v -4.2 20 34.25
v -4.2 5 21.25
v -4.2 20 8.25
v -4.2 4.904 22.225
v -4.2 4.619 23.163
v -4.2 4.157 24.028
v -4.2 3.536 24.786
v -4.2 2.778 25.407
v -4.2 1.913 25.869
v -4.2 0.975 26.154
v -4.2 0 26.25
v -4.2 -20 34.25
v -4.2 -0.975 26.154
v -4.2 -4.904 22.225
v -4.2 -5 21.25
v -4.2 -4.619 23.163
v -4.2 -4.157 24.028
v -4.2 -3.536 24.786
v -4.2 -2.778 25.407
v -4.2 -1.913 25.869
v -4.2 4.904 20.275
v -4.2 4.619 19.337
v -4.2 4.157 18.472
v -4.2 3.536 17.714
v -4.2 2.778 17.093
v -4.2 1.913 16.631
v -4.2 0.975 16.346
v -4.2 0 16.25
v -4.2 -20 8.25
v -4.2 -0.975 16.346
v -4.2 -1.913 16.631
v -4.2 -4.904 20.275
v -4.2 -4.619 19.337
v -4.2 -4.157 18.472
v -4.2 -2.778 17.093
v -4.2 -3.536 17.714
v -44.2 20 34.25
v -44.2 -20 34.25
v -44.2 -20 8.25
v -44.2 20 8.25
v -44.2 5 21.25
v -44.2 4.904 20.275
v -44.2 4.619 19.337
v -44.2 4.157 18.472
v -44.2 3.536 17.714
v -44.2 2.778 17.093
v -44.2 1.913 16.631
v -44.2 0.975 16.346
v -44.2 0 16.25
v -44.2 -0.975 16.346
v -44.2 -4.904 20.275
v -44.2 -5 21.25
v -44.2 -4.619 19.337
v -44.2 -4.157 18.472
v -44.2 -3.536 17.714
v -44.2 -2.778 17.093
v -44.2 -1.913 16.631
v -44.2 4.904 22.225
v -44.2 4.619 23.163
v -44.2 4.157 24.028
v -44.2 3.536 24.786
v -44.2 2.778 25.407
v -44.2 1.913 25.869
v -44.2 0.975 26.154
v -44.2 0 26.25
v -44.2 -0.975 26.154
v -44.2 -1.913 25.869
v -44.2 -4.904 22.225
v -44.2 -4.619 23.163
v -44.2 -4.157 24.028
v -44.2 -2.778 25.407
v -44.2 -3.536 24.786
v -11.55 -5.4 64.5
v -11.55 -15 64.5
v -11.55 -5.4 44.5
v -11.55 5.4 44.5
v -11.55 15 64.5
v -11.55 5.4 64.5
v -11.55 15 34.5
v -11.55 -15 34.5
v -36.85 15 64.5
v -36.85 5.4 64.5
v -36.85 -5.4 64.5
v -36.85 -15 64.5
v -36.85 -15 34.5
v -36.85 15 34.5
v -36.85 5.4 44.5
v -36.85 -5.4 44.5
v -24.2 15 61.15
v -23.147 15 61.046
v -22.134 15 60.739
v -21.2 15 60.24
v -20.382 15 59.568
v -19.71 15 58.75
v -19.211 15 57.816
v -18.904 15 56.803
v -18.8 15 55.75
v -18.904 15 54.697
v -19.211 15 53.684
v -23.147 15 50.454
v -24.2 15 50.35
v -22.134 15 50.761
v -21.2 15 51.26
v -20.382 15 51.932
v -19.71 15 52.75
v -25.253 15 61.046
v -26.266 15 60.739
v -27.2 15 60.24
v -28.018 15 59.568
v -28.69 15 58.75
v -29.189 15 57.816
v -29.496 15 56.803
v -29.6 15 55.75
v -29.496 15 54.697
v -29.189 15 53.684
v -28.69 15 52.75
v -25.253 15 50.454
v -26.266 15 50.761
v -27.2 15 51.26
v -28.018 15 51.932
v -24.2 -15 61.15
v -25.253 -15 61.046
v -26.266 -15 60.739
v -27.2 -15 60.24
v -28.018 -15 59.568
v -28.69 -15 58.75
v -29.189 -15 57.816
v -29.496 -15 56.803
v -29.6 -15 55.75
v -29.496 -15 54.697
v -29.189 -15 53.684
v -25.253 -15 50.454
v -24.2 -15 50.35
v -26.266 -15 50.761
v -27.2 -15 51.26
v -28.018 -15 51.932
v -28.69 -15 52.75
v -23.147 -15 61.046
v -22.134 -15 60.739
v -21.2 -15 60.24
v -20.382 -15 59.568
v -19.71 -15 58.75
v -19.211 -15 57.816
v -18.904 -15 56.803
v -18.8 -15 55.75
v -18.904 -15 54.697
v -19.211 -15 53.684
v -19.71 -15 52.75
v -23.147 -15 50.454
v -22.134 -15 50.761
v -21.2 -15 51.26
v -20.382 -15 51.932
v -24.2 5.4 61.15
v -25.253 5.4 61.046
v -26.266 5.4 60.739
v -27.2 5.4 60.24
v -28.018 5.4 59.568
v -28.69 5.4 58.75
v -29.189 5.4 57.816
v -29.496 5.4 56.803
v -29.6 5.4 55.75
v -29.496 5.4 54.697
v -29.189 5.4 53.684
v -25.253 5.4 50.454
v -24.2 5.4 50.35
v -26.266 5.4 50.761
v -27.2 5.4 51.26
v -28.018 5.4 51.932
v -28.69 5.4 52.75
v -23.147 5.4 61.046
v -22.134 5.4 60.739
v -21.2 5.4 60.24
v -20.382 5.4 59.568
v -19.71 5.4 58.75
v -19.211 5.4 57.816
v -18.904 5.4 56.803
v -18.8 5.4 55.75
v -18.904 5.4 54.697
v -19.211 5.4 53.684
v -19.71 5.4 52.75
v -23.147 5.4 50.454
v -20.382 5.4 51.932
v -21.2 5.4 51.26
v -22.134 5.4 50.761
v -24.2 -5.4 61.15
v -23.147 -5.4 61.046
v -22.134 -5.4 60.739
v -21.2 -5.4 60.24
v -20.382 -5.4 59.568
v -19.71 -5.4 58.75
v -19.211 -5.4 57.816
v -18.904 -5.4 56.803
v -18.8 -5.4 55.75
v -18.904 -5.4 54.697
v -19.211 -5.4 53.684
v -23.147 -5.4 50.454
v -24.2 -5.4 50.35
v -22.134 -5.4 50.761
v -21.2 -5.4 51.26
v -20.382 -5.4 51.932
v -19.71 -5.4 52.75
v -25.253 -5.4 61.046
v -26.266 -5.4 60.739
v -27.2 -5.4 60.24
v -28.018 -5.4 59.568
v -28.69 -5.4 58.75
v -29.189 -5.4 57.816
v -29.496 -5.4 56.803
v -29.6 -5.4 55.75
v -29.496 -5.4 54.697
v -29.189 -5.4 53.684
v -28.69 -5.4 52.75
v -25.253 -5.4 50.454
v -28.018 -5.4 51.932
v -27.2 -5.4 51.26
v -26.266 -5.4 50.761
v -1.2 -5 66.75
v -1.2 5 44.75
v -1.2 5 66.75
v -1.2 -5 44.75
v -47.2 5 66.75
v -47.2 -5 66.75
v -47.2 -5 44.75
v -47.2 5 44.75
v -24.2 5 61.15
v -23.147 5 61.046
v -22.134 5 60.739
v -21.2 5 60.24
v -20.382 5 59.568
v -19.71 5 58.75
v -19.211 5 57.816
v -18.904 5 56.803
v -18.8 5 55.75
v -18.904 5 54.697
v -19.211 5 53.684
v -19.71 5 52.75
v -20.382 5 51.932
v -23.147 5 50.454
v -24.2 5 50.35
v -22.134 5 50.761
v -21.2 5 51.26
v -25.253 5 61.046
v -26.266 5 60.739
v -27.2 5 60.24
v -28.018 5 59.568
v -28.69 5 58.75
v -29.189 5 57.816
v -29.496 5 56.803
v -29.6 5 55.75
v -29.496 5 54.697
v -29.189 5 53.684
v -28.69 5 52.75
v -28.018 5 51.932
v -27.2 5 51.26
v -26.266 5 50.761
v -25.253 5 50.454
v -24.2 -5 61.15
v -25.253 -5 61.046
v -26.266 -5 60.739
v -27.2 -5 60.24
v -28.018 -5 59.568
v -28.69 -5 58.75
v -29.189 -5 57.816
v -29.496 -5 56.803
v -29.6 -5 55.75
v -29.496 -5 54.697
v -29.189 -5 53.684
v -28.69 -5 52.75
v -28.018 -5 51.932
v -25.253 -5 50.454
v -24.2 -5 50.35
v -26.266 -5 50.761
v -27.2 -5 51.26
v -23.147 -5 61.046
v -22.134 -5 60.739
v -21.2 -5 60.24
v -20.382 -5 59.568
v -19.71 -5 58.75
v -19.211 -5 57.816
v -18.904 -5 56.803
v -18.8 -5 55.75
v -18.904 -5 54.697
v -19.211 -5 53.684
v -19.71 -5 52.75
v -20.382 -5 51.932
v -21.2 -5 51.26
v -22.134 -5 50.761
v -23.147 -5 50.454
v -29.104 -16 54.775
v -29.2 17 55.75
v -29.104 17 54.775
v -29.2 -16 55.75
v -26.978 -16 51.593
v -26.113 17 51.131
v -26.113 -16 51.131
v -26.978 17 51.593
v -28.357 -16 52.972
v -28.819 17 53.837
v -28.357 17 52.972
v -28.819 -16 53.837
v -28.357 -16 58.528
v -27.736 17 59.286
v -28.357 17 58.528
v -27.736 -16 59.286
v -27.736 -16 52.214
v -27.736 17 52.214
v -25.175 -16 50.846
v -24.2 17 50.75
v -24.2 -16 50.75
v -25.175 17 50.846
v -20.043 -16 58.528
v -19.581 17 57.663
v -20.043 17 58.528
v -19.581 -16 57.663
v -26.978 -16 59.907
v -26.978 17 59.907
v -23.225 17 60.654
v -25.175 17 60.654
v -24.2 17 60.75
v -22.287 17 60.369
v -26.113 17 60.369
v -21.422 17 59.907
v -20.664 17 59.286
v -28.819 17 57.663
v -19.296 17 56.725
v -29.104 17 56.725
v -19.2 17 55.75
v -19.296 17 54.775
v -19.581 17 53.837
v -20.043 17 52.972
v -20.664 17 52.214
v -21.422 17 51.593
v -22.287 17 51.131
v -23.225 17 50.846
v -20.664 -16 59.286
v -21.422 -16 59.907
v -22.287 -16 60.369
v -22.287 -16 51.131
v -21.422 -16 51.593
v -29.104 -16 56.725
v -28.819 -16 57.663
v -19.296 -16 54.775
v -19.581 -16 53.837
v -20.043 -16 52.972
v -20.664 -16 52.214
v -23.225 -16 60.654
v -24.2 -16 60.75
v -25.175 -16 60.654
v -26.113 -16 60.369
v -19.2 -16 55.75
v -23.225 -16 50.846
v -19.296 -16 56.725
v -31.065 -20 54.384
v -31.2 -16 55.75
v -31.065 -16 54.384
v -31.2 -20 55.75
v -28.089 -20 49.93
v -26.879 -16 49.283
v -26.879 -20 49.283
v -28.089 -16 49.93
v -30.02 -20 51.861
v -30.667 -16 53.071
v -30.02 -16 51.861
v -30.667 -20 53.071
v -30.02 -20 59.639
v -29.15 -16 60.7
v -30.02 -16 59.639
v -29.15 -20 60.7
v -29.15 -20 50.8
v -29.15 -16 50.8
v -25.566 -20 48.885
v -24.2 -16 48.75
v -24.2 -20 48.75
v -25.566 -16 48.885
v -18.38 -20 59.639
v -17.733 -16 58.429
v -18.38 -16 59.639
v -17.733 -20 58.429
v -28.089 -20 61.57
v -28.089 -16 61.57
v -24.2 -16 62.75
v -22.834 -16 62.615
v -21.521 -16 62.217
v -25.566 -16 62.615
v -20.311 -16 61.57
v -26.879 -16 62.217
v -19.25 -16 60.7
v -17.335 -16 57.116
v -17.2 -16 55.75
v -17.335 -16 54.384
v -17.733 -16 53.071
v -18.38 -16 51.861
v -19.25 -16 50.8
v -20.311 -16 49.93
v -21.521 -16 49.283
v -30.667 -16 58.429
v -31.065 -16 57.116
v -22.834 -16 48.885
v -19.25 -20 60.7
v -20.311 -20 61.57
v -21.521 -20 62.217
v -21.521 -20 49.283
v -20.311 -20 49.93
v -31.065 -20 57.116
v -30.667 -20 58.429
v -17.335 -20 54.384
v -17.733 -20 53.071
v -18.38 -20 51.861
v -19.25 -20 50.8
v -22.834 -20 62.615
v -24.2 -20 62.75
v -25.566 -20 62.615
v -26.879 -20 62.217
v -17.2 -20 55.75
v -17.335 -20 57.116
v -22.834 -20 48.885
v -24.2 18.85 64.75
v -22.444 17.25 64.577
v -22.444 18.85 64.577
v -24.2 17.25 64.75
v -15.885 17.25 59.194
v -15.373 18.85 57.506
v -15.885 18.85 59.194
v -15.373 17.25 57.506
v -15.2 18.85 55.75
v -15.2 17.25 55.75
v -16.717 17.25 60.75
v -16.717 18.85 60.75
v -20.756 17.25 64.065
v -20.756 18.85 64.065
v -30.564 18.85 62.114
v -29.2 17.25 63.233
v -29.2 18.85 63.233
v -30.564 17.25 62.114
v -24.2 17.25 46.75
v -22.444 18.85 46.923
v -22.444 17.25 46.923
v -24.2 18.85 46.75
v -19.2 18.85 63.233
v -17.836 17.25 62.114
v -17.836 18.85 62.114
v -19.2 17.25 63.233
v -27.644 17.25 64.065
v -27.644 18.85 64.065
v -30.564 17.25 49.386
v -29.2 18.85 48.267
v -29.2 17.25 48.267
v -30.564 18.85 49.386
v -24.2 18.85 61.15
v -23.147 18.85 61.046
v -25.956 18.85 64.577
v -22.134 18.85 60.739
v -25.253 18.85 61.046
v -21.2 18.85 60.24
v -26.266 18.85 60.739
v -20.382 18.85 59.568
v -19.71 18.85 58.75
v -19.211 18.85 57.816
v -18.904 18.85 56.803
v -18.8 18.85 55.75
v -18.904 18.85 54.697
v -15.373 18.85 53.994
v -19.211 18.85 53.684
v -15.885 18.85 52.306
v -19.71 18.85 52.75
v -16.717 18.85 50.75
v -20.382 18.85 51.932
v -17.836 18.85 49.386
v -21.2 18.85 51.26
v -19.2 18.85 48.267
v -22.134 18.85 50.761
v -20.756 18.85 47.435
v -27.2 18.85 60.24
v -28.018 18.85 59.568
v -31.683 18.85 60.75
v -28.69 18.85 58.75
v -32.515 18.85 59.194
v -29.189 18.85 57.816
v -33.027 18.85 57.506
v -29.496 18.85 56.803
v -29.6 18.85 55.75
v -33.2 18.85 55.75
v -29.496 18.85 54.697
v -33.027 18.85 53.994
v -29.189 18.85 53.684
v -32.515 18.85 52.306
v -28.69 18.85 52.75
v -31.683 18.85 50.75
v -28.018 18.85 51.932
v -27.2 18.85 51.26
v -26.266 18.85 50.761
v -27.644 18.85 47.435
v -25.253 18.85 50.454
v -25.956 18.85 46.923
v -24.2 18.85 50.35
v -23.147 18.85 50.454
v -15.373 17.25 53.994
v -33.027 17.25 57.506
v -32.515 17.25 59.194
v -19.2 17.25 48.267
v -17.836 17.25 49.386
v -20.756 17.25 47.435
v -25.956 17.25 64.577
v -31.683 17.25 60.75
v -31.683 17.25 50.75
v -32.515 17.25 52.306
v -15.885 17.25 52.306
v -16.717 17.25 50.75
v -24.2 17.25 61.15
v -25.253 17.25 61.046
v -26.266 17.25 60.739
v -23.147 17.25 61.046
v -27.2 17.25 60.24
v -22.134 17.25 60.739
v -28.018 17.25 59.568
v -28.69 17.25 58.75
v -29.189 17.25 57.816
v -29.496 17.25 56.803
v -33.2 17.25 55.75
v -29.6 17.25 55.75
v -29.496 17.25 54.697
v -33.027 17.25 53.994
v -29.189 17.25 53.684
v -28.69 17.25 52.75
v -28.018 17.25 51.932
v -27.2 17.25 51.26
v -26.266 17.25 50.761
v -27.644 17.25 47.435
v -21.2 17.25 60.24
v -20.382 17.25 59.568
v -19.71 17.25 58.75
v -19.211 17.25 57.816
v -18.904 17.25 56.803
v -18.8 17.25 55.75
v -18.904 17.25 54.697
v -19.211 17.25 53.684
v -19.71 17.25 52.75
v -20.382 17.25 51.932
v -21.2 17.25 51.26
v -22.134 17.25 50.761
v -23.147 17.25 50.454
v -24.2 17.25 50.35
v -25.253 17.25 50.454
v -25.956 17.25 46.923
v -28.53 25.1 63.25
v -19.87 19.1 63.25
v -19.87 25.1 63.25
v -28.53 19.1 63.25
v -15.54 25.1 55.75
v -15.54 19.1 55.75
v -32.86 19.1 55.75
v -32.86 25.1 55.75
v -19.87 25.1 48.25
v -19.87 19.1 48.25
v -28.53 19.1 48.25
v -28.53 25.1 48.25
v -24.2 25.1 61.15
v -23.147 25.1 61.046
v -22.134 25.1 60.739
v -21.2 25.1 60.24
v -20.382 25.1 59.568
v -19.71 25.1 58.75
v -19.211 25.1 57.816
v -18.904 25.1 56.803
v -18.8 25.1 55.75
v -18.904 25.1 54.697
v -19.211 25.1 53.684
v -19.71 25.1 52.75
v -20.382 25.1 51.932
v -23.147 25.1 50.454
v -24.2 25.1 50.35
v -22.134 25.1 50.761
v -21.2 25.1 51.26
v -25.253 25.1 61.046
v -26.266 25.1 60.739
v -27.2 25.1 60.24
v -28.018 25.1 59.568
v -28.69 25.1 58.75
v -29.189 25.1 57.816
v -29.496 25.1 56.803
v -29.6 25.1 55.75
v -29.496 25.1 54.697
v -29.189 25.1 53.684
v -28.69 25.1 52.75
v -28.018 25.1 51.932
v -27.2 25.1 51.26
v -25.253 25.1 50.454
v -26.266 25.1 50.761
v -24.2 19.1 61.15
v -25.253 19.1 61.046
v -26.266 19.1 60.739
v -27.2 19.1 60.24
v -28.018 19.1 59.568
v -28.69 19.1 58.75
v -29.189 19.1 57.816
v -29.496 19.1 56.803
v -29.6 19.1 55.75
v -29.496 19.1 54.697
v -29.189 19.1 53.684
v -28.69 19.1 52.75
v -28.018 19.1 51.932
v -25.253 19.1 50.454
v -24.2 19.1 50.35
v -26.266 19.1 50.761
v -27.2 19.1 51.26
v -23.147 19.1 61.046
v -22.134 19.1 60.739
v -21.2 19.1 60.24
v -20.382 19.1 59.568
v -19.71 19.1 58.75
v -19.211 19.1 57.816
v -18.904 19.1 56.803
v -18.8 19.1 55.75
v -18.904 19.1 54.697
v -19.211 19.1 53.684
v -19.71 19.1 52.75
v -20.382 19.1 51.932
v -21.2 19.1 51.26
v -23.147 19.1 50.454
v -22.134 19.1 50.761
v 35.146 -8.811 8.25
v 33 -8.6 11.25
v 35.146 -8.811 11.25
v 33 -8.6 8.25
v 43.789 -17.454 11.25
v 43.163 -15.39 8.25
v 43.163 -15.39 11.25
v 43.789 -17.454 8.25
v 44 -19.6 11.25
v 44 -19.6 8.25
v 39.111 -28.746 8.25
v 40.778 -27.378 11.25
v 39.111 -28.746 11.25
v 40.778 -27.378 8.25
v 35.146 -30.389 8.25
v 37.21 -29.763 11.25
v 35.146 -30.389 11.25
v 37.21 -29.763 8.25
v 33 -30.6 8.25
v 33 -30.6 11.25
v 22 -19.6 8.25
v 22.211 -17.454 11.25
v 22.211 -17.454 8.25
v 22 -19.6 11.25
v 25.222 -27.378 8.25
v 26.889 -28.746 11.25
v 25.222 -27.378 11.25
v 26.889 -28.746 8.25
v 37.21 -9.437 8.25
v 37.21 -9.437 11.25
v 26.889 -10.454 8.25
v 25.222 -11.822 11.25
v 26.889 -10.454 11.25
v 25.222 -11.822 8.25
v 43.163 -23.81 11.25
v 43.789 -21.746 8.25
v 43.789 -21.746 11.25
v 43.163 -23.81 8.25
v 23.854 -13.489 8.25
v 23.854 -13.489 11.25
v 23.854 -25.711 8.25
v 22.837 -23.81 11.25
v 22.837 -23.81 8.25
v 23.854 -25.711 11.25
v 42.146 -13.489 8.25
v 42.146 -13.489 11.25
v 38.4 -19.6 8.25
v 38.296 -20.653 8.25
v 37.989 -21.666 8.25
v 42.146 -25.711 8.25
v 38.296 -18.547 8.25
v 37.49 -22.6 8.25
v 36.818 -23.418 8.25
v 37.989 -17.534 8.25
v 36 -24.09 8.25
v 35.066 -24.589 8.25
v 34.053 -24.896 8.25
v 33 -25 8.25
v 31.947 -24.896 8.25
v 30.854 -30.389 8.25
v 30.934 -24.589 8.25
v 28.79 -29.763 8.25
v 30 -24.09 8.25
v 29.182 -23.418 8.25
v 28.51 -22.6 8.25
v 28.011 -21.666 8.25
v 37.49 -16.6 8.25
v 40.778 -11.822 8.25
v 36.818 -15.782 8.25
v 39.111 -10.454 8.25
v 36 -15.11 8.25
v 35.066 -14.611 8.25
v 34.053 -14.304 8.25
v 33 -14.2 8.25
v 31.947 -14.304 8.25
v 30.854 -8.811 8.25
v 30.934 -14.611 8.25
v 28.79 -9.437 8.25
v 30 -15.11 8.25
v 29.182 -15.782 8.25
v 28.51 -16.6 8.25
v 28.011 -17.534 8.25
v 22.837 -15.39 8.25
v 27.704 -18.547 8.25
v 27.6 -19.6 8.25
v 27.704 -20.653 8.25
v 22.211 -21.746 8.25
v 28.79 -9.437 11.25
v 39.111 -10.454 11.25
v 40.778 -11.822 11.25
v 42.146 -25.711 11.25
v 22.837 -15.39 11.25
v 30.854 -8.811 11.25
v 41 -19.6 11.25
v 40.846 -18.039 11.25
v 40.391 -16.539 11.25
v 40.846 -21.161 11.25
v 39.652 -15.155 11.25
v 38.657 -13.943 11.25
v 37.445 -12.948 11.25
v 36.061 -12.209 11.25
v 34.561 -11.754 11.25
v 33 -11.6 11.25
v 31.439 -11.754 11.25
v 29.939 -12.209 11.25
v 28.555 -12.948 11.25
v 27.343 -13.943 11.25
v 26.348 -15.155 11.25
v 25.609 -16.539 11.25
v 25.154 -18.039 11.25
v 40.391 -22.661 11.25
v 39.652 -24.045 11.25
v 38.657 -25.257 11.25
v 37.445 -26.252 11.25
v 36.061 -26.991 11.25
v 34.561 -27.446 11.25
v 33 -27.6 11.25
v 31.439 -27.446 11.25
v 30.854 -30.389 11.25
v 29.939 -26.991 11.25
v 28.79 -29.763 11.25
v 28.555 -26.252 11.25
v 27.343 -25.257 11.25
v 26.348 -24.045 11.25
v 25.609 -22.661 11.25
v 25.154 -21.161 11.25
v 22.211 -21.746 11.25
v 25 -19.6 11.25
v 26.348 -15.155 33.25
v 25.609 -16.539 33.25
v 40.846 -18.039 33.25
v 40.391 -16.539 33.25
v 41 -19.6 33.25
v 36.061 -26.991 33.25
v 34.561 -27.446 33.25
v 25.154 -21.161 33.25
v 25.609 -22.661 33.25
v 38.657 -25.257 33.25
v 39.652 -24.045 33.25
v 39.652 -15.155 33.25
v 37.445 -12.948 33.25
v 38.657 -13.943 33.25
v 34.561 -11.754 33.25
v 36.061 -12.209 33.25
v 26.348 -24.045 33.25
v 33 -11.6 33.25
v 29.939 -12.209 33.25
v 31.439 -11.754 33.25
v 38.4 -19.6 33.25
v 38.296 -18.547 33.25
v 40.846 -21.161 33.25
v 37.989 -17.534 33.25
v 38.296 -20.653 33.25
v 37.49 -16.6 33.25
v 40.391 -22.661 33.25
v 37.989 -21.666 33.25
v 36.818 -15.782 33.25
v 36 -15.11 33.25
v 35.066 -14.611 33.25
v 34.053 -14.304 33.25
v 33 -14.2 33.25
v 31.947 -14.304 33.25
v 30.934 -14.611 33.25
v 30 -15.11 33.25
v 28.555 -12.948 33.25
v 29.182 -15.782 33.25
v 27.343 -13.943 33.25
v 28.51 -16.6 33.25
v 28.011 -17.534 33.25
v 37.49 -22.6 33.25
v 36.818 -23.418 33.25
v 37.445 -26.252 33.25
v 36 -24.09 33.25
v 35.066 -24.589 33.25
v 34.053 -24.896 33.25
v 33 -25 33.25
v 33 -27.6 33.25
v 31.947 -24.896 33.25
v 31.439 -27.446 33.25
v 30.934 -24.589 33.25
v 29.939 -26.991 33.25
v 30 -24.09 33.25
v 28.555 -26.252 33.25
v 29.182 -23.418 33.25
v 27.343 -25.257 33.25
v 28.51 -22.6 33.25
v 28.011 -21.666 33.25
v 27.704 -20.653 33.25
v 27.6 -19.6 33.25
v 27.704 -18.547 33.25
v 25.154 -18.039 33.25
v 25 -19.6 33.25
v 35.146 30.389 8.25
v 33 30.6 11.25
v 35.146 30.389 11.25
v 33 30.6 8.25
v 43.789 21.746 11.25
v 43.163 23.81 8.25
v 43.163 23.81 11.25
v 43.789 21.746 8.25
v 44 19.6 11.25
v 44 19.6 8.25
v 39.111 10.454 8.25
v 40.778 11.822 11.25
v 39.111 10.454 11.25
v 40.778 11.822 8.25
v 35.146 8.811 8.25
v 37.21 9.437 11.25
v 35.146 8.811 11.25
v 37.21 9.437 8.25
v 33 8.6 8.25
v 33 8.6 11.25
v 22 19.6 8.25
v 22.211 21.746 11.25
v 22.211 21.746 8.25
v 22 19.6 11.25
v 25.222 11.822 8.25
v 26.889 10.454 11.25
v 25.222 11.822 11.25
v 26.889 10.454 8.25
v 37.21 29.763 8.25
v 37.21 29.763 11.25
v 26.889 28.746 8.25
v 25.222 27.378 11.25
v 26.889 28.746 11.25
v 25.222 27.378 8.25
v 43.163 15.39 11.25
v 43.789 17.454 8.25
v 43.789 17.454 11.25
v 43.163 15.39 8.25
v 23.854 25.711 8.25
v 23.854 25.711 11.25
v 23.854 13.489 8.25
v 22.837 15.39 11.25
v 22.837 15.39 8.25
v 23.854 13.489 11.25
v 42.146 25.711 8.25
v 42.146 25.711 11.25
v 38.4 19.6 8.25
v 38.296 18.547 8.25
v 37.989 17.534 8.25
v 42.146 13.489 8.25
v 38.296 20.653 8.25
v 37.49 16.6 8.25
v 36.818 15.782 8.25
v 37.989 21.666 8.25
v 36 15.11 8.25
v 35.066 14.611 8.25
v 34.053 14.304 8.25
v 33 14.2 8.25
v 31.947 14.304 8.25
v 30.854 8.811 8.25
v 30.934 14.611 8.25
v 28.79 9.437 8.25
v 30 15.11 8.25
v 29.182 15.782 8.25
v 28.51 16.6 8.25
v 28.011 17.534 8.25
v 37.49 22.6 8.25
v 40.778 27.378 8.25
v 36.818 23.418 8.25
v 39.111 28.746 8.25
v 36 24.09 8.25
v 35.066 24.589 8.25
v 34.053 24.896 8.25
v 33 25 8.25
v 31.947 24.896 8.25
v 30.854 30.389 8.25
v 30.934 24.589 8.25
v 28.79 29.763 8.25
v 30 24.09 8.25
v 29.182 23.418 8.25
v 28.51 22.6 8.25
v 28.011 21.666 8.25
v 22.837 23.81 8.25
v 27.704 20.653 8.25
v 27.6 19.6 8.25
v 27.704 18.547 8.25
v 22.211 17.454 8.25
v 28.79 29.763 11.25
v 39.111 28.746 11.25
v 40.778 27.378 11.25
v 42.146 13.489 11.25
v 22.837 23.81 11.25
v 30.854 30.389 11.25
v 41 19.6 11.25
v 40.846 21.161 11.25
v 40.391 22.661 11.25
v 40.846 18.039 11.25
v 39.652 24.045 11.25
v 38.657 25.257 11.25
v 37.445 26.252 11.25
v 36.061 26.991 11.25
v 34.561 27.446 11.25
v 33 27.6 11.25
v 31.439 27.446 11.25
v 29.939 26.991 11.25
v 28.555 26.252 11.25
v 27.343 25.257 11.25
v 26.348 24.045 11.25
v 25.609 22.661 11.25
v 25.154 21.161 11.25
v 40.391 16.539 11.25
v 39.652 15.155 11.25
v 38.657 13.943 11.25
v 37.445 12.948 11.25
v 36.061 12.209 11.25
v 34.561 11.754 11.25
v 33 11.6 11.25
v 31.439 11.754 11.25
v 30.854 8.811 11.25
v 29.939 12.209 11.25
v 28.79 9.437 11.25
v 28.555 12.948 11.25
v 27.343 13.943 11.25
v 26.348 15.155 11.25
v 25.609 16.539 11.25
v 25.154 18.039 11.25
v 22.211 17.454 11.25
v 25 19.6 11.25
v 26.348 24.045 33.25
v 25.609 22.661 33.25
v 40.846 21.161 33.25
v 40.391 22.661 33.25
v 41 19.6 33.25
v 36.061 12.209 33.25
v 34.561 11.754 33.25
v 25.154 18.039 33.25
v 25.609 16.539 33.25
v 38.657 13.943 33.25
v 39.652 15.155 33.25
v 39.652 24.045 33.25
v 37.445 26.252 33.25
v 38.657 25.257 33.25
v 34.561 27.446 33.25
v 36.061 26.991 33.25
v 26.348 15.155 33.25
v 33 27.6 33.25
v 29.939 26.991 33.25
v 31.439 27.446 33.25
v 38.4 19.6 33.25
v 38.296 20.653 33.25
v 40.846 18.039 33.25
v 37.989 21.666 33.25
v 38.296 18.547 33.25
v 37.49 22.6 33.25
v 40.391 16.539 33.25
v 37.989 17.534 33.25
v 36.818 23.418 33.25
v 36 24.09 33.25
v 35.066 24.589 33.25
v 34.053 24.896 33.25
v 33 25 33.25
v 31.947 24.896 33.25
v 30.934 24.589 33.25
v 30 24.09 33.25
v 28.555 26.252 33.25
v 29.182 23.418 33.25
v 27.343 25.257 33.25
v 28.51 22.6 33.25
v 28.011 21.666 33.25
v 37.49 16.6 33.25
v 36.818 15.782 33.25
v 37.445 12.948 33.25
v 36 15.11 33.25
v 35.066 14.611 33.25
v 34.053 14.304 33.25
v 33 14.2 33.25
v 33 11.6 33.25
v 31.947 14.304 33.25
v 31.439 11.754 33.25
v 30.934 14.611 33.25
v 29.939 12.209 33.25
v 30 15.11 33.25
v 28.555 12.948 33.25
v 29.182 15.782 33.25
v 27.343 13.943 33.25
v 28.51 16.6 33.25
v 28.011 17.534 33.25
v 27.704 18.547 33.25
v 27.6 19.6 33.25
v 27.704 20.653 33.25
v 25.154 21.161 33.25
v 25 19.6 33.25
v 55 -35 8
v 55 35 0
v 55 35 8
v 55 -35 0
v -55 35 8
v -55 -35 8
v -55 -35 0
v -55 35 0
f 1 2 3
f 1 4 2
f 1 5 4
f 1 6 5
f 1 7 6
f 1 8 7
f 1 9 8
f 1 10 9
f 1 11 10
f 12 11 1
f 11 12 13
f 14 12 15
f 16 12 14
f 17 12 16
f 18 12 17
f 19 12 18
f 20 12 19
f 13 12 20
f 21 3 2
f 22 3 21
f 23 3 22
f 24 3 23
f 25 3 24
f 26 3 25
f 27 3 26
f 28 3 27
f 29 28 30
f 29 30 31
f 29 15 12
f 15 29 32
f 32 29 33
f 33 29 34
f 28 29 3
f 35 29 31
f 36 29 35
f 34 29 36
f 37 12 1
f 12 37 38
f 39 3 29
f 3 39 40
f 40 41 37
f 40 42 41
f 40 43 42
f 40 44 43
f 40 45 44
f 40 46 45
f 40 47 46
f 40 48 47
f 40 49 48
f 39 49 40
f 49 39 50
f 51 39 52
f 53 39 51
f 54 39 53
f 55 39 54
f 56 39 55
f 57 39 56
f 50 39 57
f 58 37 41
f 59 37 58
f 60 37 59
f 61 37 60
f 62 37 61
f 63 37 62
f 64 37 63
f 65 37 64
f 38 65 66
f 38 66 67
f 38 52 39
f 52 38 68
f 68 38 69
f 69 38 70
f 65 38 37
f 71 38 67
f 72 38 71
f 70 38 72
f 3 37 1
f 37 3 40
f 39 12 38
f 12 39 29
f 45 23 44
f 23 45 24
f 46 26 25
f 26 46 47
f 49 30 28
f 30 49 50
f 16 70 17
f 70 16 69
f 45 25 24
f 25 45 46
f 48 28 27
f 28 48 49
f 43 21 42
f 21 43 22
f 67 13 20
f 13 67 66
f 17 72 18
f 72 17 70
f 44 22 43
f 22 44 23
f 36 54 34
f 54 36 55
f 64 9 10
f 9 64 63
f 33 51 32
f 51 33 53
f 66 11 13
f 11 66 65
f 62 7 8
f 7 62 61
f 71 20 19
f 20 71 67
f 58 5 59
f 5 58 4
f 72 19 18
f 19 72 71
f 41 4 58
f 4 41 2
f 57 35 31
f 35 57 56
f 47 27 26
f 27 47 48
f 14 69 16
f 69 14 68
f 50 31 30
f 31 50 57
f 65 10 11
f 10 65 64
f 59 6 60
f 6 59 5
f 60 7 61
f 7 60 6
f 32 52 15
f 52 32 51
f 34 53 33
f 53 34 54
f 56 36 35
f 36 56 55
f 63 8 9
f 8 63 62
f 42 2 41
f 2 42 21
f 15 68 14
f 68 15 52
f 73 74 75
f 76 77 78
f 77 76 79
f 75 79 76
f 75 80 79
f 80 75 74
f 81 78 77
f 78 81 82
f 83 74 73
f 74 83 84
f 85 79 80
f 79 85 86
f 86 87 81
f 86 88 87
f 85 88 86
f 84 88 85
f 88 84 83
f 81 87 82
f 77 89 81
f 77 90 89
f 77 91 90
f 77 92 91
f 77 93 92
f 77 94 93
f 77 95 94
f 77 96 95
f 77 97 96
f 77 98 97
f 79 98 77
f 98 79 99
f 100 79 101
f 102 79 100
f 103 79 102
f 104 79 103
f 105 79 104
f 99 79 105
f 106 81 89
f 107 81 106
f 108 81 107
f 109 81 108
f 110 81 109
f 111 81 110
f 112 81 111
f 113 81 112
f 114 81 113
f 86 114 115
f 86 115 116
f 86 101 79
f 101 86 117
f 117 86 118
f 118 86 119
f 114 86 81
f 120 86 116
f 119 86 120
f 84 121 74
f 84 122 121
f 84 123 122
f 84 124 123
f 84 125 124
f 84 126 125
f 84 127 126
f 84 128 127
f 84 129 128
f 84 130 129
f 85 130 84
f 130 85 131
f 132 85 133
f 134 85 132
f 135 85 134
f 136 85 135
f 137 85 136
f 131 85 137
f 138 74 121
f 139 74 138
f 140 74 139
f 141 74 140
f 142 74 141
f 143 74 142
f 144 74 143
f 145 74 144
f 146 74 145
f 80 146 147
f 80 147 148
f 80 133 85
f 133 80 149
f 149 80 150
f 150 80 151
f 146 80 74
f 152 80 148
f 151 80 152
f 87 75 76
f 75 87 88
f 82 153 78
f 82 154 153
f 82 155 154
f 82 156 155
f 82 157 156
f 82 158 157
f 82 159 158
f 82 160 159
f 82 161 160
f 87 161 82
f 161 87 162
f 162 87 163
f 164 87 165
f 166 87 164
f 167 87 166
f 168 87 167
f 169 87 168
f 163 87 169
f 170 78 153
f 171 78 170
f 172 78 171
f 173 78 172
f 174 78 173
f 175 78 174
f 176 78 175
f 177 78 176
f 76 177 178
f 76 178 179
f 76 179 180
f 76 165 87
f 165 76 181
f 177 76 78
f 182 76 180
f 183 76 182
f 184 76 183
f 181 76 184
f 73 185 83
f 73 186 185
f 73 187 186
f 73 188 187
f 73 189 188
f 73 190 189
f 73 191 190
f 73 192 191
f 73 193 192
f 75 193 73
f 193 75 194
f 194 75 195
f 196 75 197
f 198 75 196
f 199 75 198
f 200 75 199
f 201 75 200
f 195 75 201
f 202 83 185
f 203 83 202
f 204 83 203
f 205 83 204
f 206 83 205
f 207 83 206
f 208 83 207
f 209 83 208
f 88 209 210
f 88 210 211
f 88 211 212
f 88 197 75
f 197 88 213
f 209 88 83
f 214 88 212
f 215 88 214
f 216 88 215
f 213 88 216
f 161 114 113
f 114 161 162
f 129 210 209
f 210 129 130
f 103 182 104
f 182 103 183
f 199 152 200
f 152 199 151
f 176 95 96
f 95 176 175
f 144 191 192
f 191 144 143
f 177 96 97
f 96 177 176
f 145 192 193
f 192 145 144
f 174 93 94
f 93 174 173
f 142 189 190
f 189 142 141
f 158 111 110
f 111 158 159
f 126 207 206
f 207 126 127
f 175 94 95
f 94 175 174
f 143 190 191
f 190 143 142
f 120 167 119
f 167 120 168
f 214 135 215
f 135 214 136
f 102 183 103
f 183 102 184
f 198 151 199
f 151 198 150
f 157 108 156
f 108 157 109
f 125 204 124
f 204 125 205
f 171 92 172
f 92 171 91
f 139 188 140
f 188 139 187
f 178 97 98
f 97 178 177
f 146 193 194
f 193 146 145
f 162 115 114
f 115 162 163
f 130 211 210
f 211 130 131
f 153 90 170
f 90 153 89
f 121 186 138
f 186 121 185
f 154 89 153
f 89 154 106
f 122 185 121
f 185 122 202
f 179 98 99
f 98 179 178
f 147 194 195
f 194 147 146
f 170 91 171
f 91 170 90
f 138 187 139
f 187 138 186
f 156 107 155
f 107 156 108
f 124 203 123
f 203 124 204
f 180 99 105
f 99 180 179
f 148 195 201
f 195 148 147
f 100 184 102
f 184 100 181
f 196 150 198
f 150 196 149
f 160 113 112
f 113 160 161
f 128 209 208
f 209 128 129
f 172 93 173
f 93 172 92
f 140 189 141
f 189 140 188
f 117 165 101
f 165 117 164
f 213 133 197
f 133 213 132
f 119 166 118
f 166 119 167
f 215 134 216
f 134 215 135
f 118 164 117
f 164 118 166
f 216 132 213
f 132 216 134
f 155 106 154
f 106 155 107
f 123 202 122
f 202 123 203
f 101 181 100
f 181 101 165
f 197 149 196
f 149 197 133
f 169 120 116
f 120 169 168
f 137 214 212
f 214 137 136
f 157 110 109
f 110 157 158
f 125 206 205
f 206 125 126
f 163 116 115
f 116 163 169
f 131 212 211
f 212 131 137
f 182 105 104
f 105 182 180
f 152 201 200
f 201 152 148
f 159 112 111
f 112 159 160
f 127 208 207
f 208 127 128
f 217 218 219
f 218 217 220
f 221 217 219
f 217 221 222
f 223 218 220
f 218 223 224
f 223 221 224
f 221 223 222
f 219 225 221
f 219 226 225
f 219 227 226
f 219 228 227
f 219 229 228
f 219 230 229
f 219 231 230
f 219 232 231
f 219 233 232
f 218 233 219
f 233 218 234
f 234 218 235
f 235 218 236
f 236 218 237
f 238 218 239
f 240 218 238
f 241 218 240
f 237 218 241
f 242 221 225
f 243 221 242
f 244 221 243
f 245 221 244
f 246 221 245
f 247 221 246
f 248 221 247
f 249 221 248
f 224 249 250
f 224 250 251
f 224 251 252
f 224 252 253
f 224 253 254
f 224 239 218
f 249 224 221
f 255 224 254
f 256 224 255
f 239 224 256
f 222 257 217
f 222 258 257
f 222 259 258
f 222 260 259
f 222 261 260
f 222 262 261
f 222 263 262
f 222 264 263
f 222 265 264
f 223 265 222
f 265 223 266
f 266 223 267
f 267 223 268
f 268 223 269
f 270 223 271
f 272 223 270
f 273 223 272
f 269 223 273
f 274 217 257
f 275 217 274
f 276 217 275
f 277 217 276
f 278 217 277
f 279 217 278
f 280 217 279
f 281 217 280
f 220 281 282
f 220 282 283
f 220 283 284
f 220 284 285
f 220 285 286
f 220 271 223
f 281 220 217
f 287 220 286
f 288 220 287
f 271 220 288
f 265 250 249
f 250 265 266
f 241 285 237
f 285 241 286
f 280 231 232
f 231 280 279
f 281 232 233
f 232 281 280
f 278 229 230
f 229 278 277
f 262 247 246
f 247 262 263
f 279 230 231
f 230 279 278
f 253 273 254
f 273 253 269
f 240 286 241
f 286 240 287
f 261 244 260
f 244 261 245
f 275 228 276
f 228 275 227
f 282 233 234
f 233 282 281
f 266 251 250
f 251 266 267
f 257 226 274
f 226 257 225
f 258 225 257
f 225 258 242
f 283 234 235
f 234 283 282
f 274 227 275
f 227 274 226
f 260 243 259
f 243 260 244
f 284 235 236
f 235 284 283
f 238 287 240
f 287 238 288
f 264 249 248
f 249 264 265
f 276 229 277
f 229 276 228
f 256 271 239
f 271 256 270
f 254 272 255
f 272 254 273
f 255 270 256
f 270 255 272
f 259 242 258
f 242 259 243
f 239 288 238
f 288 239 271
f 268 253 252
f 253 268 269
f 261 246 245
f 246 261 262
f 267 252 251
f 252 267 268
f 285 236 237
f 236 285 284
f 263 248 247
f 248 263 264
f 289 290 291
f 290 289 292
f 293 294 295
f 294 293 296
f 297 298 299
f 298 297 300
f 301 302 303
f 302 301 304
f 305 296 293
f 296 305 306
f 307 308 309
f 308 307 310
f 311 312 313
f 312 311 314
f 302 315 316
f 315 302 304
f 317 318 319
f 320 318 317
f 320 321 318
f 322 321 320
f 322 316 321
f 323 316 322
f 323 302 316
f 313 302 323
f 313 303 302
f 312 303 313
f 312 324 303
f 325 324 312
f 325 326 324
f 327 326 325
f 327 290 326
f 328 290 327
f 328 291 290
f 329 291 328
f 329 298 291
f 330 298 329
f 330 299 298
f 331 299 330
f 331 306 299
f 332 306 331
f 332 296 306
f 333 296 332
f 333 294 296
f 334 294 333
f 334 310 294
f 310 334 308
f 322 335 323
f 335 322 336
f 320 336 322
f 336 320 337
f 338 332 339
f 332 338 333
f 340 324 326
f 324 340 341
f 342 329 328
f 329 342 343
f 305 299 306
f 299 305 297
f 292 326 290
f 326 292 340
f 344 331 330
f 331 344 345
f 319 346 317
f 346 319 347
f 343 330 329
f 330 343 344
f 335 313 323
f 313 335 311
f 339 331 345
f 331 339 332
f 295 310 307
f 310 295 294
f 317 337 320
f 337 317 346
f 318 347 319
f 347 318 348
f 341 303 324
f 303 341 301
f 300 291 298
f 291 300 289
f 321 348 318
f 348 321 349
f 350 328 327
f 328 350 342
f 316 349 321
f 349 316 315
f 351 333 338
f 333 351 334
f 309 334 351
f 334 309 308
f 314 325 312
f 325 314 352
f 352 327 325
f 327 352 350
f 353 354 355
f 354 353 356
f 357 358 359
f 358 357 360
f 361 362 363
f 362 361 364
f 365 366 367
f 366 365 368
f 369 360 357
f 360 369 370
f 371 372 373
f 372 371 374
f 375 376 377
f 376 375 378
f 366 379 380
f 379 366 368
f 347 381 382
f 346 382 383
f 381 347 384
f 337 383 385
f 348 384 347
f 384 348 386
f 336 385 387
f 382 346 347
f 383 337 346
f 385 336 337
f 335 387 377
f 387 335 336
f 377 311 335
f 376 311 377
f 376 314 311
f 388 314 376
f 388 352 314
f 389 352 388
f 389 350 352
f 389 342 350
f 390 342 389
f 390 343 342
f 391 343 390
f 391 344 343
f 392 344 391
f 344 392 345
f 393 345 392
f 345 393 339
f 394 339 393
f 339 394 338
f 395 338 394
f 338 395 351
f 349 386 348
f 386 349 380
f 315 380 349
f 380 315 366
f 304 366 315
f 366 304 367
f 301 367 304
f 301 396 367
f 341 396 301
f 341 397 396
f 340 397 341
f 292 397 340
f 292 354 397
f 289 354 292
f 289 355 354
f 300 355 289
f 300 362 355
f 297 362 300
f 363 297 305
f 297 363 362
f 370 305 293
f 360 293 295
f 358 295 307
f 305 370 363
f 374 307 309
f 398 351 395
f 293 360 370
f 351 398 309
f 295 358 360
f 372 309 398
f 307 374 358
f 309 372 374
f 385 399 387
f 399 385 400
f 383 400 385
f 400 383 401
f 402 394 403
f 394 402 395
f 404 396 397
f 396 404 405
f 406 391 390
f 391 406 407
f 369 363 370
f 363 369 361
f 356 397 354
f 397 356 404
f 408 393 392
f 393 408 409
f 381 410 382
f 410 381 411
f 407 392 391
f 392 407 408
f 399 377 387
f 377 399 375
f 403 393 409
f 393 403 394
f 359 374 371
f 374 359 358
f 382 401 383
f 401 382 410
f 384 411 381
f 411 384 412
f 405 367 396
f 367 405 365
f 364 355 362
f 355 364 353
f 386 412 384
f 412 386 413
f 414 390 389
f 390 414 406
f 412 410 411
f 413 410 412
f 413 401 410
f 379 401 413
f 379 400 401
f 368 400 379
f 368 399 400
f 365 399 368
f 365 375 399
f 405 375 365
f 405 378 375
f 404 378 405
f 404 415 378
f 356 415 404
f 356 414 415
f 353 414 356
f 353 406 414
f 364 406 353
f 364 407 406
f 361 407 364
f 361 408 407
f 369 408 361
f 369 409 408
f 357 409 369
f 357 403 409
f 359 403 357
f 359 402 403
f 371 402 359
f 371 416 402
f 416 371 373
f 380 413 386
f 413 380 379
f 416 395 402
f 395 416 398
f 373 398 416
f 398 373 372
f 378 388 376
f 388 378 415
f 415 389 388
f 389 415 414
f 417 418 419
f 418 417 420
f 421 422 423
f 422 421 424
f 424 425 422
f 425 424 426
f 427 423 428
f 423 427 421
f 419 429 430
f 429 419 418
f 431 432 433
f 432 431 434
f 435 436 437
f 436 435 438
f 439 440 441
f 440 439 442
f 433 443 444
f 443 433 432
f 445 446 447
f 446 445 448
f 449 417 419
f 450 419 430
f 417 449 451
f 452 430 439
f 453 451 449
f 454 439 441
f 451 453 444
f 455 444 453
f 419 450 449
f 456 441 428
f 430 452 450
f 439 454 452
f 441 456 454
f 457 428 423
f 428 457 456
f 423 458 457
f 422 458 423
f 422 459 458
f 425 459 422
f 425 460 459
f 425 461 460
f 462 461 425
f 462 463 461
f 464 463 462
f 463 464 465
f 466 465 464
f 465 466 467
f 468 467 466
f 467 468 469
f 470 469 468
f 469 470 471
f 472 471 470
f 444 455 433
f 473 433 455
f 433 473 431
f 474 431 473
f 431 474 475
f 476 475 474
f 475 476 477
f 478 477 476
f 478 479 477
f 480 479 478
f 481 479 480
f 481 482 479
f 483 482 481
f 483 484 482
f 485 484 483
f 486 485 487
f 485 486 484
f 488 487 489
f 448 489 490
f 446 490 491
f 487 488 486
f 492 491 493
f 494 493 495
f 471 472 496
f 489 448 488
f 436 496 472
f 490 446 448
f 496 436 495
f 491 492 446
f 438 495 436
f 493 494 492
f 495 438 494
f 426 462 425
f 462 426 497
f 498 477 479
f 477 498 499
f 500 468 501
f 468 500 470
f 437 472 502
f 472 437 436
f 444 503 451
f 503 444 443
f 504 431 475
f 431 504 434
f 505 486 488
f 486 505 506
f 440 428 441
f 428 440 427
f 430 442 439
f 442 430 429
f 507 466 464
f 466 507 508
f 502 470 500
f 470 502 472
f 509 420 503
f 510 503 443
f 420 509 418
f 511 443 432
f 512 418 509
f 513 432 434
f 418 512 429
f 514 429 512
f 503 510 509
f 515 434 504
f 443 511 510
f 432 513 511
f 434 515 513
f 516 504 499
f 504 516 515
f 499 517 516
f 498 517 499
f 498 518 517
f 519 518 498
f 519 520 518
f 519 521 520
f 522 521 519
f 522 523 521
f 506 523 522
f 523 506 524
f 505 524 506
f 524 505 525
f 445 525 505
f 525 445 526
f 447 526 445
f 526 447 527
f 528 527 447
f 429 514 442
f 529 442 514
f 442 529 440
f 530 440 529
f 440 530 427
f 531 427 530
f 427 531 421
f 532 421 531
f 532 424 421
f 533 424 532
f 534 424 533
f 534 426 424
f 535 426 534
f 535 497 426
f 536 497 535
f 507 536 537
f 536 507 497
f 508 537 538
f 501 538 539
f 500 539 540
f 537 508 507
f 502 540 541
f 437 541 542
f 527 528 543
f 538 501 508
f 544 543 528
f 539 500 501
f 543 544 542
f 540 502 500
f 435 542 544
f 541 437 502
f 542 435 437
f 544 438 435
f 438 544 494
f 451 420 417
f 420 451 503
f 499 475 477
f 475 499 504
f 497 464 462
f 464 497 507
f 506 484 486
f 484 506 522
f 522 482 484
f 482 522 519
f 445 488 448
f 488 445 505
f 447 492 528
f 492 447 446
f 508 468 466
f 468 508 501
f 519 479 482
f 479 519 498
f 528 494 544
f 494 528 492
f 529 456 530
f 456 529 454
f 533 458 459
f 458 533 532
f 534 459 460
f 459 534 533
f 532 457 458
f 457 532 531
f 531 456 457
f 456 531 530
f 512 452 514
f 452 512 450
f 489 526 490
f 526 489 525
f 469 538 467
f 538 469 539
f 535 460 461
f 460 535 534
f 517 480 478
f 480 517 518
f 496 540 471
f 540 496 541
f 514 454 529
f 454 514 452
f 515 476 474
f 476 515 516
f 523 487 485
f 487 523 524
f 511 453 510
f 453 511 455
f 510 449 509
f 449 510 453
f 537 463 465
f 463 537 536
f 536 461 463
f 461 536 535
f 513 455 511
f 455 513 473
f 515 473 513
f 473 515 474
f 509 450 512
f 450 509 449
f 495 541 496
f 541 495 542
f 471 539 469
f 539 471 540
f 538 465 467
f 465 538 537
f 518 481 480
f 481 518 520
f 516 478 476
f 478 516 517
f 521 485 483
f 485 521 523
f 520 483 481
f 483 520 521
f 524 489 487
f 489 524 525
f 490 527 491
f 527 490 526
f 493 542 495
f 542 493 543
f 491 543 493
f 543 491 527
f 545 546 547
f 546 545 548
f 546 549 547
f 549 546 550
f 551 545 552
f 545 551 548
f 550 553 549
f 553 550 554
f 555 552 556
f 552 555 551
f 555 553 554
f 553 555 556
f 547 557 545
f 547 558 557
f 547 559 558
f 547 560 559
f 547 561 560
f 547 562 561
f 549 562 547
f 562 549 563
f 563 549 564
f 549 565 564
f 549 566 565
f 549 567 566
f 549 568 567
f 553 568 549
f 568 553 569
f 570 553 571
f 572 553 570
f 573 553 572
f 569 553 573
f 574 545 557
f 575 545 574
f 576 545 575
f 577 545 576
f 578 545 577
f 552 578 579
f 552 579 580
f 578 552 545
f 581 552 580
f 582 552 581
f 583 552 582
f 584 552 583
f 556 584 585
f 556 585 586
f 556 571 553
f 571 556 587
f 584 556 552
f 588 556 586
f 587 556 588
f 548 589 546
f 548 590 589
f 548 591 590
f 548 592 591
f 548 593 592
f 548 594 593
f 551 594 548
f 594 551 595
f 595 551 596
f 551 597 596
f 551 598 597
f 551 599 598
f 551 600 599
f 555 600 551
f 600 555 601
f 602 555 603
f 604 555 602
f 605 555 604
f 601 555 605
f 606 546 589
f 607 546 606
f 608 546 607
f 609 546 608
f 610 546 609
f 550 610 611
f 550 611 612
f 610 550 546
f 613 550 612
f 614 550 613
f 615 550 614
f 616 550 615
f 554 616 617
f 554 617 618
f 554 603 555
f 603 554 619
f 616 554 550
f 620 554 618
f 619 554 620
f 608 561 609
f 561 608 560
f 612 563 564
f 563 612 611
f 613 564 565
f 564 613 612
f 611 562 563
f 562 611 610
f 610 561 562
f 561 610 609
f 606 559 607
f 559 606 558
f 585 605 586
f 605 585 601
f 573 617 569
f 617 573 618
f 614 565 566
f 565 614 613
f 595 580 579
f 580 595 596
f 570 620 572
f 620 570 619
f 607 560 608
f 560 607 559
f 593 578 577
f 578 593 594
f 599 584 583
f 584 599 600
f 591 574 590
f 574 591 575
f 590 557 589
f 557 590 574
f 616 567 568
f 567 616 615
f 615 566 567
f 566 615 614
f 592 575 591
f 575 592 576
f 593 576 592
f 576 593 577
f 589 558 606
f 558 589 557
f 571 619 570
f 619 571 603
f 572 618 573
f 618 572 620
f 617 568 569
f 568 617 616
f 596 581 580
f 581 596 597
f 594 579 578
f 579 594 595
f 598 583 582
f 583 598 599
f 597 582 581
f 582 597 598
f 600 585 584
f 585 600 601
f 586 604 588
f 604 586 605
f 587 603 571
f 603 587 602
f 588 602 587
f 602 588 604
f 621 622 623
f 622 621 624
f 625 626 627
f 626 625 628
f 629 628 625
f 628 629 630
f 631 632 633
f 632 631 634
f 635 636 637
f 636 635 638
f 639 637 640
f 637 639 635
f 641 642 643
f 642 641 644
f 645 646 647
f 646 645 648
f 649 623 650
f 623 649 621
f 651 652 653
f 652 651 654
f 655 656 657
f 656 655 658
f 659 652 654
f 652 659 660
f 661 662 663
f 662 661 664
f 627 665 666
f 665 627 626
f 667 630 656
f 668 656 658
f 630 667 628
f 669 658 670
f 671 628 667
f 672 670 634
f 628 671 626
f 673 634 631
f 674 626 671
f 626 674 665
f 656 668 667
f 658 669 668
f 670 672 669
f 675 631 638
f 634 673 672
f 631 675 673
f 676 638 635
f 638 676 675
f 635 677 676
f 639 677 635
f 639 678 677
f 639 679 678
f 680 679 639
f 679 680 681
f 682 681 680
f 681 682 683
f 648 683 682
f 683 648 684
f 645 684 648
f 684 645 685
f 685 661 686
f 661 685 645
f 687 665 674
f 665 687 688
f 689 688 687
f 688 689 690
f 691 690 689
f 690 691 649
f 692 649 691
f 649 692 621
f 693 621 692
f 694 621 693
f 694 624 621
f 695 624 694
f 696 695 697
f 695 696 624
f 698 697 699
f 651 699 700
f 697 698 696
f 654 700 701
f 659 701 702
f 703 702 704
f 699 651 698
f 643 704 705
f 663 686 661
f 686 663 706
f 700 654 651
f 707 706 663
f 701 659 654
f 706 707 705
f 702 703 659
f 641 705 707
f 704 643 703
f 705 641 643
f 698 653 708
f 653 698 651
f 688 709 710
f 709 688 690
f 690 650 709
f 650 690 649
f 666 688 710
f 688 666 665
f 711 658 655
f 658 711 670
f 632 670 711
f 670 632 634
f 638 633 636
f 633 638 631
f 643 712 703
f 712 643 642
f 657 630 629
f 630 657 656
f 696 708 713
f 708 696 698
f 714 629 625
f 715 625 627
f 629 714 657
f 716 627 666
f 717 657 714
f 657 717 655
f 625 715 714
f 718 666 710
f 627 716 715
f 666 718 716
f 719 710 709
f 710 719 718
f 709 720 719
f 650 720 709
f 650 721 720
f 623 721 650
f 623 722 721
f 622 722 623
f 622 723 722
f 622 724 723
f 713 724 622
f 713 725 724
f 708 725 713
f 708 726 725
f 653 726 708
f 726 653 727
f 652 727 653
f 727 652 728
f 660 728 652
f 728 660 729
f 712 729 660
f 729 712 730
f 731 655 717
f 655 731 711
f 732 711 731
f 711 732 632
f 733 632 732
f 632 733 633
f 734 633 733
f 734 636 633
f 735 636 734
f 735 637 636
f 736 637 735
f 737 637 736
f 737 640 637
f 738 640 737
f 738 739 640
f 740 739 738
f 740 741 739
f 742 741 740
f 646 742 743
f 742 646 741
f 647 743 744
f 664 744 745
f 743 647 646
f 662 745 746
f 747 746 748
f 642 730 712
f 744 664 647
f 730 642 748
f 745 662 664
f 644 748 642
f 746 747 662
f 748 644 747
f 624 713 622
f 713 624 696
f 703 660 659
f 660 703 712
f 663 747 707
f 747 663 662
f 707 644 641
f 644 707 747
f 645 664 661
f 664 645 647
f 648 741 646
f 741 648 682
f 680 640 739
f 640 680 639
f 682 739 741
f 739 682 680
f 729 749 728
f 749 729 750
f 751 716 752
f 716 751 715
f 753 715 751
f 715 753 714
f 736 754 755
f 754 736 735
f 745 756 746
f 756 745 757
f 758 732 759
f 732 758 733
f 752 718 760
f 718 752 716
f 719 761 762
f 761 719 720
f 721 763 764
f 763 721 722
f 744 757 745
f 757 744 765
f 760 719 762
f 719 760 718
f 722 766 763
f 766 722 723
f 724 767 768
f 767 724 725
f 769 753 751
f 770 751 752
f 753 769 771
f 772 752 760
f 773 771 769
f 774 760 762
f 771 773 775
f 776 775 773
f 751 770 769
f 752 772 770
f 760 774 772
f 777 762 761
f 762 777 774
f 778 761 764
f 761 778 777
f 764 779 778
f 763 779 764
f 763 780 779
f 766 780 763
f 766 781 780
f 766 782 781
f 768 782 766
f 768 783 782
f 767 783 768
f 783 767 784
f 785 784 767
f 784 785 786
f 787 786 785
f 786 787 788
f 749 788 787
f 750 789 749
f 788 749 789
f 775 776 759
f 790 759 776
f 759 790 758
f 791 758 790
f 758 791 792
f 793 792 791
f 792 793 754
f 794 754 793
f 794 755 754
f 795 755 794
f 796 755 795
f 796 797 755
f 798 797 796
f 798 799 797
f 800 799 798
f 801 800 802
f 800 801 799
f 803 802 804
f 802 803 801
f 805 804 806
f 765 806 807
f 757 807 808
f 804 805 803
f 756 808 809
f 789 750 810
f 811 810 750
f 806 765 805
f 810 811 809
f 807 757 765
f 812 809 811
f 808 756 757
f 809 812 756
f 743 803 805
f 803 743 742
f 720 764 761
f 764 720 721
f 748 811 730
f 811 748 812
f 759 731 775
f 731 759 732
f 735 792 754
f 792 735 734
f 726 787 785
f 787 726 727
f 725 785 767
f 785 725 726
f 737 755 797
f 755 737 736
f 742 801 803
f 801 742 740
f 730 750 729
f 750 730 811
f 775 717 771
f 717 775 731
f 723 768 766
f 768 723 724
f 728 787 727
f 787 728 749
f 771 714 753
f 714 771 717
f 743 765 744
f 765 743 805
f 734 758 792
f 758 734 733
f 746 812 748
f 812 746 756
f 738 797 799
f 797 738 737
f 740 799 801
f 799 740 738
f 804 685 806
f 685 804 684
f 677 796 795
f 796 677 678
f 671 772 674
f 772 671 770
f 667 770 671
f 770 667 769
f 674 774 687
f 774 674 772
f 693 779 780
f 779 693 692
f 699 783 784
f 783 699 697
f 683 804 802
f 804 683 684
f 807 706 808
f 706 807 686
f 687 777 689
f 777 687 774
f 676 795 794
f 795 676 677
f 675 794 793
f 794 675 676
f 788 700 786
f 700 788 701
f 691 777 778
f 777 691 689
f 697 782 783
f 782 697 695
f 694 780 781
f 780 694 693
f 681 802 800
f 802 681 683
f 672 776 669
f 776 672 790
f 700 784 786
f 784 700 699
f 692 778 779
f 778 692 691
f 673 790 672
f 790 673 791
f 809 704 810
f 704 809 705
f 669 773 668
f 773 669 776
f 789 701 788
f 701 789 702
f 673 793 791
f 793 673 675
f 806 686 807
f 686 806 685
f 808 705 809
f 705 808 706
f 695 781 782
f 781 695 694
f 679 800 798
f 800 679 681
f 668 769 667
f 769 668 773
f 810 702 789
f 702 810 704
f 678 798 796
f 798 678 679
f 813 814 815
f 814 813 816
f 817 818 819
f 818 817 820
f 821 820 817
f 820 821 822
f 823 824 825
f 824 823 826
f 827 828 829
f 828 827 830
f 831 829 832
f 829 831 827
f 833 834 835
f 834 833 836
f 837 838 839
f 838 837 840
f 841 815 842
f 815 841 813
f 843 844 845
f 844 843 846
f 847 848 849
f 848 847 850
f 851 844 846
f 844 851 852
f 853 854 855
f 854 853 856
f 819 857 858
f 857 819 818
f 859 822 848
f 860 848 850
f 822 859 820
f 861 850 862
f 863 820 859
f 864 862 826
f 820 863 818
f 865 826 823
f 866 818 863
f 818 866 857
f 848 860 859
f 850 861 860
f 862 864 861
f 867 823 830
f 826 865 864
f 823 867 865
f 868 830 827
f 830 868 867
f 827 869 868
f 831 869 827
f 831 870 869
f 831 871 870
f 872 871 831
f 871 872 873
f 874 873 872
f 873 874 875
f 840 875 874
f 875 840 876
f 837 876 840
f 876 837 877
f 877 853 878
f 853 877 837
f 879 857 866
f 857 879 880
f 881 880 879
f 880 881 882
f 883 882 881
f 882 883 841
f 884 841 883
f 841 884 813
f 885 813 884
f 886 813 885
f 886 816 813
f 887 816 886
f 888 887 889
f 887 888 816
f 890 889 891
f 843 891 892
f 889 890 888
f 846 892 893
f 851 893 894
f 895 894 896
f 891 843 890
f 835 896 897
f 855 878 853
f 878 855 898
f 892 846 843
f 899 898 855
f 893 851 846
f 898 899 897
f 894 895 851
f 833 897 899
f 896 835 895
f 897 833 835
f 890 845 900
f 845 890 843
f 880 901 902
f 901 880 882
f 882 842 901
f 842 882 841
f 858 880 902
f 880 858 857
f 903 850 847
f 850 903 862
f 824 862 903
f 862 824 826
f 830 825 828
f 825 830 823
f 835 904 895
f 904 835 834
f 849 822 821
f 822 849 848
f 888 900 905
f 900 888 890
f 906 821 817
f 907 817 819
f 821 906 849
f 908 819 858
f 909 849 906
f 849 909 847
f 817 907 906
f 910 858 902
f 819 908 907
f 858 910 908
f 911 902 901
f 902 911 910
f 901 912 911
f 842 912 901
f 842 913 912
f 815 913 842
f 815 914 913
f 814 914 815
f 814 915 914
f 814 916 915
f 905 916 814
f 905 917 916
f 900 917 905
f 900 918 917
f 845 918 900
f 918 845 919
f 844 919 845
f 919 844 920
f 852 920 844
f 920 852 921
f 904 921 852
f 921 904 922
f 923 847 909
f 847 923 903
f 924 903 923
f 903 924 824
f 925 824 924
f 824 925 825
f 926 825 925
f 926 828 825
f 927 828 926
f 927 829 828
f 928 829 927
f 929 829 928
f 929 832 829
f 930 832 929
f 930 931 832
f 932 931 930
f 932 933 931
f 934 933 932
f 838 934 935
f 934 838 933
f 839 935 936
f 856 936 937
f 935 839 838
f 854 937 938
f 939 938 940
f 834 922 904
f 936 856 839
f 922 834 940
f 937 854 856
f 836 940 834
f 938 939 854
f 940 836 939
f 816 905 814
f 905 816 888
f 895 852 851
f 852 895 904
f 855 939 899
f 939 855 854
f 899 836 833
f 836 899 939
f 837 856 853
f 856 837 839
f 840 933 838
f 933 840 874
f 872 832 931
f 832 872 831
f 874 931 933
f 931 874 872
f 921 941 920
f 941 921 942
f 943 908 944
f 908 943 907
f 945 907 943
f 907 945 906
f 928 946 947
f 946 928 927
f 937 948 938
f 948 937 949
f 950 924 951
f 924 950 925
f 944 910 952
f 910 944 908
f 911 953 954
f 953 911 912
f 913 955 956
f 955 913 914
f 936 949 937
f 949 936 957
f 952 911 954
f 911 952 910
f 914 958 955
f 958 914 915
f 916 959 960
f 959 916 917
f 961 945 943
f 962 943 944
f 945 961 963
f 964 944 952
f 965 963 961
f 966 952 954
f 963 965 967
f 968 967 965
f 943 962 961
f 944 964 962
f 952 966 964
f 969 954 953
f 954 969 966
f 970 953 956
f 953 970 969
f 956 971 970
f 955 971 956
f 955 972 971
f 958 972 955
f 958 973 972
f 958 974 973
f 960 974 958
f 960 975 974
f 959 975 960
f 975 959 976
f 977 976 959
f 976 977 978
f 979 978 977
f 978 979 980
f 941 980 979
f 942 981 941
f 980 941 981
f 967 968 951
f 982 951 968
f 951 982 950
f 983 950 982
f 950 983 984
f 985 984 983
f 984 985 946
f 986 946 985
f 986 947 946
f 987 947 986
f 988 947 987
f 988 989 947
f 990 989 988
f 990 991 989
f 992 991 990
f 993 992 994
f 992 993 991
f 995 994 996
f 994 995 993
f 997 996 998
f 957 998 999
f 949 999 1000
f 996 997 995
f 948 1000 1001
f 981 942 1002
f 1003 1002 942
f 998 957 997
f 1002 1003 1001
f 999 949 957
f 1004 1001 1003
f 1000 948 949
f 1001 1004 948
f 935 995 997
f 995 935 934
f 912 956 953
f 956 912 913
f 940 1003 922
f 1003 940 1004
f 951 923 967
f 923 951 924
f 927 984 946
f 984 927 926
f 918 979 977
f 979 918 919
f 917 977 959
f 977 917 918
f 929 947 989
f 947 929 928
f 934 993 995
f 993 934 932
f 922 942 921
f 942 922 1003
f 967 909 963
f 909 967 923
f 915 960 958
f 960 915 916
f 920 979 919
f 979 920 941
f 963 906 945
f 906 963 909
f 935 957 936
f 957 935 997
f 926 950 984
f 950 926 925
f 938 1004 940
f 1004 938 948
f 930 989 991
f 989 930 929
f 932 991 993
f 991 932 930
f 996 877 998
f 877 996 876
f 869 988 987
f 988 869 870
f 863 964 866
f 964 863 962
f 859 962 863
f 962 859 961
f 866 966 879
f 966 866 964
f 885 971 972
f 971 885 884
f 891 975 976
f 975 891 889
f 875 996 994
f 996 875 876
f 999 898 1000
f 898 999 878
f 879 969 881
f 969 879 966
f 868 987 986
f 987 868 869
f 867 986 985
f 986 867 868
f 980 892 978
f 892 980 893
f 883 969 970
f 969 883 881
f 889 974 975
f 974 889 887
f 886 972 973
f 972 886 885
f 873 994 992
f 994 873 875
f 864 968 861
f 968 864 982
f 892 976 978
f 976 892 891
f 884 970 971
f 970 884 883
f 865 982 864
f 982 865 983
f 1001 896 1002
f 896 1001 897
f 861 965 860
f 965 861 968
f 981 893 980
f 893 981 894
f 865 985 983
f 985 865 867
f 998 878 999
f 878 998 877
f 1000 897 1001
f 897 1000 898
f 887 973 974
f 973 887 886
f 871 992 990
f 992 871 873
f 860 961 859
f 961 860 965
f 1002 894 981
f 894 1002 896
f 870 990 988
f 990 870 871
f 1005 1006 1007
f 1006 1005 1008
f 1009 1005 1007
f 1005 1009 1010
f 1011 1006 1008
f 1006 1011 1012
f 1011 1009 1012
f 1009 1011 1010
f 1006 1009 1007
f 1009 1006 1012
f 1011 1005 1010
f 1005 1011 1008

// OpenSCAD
$fn = 32;

// ------------------------------------------------------------------------
// Indexing jig: plate 110 x 70 mm, pin d10
// Every part is its own module, assembly() places every instance.
// ------------------------------------------------------------------------

// --- part 1 ---
module jig_plate() {
  difference() {
    translate([-55, -35, 0]) cube([110, 70, 8]);
  }
}

// --- part 2 ---
module locator_block() {
  difference() {
    translate([-20, -20, 0]) cube([40, 40, 26]);
    translate([0, 0, 13]) rotate([0, 90, 0]) cylinder(h = 42, d = 10, center = true);
  }
}

// --- part 3 ---
module index_fork() {
  difference() {
    translate([-12.65, -15, 0]) cube([25.3, 30, 30]);
    translate([-13.65, -5.4, 10]) cube([27.3, 10.8, 21]);
    translate([0, 0, 21.25]) rotate([90, 0, 0]) cylinder(h = 32, d = 10.8, center = true);
  }
}

// --- part 4 ---
module index_arm() {
  difference() {
    translate([-23, -5, 0]) cube([46, 10, 22]);
    translate([0, 0, 11]) rotate([90, 0, 0]) cylinder(h = 12, d = 10.8, center = true);
  }
}

// --- part 5 ---
module index_pin() {
  rotate([0, 90, 0]) cylinder(h = 34, d = 10, center = true);
  translate([-20, 0, 0]) rotate([0, 90, 0]) cylinder(h = 4, d = 14);
}

// --- part 6 ---
module pin_washer() {
  difference() {
      translate([0, 0, 0]) cylinder(h = 1.6, d = 18);
      translate([0, 0, -1]) cylinder(h = 3.6, d = 10.8);
    }
}

// --- part 7 ---
module lock_nut() {
  difference() {
    linear_extrude(height = 6) polygon(points = [[8.66, 0], [4.33, 7.5], [-4.33, 7.5], [-8.66, 0], [-4.33, -7.5], [4.33, -7.5]]);
    translate([0, 0, -1]) cylinder(h = 8, d = 10.8);
  }
}

// --- part 8 ---
module guide_bush_a() {
  difference() {
    union() {
      cylinder(h = 3, d = 22);
      translate([0, 0, 3]) cylinder(h = 22, d = 16);
    }
    translate([0, 0, -1]) cylinder(h = 27, d = 10.8);
  }
}

// --- part 9 ---
module guide_bush_b() {
  difference() {
    union() {
      cylinder(h = 3, d = 22);
      translate([0, 0, 3]) cylinder(h = 22, d = 16);
    }
    translate([0, 0, -1]) cylinder(h = 27, d = 10.8);
  }
}

// --- assembly ---
module assembly() {
  color([0.80, 0.24, 0.20]) translate([0, 0, 0]) rotate([0, 0, 0]) jig_plate();
  color([0.20, 0.45, 0.75]) translate([-24.2, 0, 8.25]) rotate([0, 0, 0]) locator_block();
  color([0.25, 0.62, 0.32]) translate([-24.2, 0, 34.5]) rotate([0, 0, 0]) index_fork();
  color([0.92, 0.70, 0.18]) translate([-24.2, 0, 44.75]) rotate([0, 0, 0]) index_arm();
  color([0.58, 0.35, 0.70]) translate([-24.2, 0, 55.75]) rotate([0, 0, 90]) index_pin();
  color([0.16, 0.66, 0.66]) translate([-24.2, 18.85, 55.75]) rotate([90, 0, 0]) pin_washer();
  color([0.85, 0.48, 0.18]) translate([-24.2, 25.1, 55.75]) rotate([90, 0, 0]) lock_nut();
  color([0.55, 0.60, 0.65]) translate([33, -19.6, 8.25]) rotate([0, 0, 0]) guide_bush_a();
  color([0.75, 0.30, 0.55]) translate([33, 19.6, 8.25]) rotate([0, 0, 0]) guide_bush_b();
}

assembly();
